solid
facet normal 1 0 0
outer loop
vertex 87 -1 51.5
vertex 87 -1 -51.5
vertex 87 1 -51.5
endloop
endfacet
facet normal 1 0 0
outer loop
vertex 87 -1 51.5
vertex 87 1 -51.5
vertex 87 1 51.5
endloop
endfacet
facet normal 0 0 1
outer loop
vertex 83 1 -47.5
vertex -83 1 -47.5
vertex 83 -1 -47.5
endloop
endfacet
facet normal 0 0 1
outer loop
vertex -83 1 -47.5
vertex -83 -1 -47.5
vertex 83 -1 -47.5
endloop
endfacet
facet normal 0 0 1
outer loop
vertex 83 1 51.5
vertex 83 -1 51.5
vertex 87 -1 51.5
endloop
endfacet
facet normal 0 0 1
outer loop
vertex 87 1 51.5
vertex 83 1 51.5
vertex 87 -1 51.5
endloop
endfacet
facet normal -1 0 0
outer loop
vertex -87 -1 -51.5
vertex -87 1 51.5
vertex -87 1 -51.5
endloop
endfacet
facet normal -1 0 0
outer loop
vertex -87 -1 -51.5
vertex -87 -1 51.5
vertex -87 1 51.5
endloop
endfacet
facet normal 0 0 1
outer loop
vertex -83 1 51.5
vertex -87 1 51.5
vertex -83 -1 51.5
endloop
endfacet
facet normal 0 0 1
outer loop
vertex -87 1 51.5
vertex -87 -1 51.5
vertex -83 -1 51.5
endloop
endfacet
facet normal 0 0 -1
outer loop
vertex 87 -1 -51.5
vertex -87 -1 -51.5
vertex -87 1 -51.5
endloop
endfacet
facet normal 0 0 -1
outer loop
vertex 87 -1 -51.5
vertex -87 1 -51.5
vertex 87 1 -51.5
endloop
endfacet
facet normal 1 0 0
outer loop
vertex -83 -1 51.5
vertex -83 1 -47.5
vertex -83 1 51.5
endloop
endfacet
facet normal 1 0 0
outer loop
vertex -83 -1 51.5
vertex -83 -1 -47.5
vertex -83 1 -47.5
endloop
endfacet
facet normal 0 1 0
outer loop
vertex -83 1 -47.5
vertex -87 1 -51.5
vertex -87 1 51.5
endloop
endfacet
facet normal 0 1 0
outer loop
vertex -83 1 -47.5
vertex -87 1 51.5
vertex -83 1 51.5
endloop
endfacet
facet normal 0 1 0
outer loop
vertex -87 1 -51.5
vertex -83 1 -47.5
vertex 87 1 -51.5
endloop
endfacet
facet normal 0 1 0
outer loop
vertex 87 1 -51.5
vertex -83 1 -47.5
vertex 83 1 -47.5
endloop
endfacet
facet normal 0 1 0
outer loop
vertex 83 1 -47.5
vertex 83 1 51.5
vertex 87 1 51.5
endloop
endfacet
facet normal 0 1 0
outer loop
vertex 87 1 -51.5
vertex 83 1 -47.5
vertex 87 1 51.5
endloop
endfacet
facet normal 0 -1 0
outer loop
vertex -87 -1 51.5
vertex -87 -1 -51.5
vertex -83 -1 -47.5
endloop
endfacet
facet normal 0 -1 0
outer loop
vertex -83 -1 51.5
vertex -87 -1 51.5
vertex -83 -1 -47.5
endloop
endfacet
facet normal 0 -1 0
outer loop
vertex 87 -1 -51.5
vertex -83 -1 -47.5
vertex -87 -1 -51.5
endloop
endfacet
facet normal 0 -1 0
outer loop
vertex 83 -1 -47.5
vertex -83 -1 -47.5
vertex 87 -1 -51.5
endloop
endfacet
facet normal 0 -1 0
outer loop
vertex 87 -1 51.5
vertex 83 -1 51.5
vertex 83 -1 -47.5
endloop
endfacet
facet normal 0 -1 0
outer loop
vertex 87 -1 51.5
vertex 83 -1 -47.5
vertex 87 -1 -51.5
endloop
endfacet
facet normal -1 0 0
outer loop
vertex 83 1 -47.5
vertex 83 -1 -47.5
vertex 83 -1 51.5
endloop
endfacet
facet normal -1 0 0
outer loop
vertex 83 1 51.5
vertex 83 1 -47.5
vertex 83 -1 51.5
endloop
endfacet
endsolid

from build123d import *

# Parameters (mm, degrees)
F0_W     = 4
F0_H     = 99
F0_H_2   = 4
F0_W_2   = 166
F1_DEPTH = 1


with BuildPart() as f1:
    # F0 (on Front) → F1 (new body, symmetric)
    with BuildSketch(Plane.XZ):
        with Locations((-85, 2)):
            Rectangle(F0_W, F0_H)
        with Locations((-85, -49.5)):
            Rectangle(F0_W, F0_H_2)
        with Locations((0, -49.5)):
            Rectangle(F0_W_2, F0_H_2)
        with Locations((85, 2)):
            Rectangle(F0_W, F0_H)
        with Locations((85, -49.5)):
            Rectangle(F0_W, F0_H_2)
    extrude(amount=F1_DEPTH, both=True)


solid = f1.part
